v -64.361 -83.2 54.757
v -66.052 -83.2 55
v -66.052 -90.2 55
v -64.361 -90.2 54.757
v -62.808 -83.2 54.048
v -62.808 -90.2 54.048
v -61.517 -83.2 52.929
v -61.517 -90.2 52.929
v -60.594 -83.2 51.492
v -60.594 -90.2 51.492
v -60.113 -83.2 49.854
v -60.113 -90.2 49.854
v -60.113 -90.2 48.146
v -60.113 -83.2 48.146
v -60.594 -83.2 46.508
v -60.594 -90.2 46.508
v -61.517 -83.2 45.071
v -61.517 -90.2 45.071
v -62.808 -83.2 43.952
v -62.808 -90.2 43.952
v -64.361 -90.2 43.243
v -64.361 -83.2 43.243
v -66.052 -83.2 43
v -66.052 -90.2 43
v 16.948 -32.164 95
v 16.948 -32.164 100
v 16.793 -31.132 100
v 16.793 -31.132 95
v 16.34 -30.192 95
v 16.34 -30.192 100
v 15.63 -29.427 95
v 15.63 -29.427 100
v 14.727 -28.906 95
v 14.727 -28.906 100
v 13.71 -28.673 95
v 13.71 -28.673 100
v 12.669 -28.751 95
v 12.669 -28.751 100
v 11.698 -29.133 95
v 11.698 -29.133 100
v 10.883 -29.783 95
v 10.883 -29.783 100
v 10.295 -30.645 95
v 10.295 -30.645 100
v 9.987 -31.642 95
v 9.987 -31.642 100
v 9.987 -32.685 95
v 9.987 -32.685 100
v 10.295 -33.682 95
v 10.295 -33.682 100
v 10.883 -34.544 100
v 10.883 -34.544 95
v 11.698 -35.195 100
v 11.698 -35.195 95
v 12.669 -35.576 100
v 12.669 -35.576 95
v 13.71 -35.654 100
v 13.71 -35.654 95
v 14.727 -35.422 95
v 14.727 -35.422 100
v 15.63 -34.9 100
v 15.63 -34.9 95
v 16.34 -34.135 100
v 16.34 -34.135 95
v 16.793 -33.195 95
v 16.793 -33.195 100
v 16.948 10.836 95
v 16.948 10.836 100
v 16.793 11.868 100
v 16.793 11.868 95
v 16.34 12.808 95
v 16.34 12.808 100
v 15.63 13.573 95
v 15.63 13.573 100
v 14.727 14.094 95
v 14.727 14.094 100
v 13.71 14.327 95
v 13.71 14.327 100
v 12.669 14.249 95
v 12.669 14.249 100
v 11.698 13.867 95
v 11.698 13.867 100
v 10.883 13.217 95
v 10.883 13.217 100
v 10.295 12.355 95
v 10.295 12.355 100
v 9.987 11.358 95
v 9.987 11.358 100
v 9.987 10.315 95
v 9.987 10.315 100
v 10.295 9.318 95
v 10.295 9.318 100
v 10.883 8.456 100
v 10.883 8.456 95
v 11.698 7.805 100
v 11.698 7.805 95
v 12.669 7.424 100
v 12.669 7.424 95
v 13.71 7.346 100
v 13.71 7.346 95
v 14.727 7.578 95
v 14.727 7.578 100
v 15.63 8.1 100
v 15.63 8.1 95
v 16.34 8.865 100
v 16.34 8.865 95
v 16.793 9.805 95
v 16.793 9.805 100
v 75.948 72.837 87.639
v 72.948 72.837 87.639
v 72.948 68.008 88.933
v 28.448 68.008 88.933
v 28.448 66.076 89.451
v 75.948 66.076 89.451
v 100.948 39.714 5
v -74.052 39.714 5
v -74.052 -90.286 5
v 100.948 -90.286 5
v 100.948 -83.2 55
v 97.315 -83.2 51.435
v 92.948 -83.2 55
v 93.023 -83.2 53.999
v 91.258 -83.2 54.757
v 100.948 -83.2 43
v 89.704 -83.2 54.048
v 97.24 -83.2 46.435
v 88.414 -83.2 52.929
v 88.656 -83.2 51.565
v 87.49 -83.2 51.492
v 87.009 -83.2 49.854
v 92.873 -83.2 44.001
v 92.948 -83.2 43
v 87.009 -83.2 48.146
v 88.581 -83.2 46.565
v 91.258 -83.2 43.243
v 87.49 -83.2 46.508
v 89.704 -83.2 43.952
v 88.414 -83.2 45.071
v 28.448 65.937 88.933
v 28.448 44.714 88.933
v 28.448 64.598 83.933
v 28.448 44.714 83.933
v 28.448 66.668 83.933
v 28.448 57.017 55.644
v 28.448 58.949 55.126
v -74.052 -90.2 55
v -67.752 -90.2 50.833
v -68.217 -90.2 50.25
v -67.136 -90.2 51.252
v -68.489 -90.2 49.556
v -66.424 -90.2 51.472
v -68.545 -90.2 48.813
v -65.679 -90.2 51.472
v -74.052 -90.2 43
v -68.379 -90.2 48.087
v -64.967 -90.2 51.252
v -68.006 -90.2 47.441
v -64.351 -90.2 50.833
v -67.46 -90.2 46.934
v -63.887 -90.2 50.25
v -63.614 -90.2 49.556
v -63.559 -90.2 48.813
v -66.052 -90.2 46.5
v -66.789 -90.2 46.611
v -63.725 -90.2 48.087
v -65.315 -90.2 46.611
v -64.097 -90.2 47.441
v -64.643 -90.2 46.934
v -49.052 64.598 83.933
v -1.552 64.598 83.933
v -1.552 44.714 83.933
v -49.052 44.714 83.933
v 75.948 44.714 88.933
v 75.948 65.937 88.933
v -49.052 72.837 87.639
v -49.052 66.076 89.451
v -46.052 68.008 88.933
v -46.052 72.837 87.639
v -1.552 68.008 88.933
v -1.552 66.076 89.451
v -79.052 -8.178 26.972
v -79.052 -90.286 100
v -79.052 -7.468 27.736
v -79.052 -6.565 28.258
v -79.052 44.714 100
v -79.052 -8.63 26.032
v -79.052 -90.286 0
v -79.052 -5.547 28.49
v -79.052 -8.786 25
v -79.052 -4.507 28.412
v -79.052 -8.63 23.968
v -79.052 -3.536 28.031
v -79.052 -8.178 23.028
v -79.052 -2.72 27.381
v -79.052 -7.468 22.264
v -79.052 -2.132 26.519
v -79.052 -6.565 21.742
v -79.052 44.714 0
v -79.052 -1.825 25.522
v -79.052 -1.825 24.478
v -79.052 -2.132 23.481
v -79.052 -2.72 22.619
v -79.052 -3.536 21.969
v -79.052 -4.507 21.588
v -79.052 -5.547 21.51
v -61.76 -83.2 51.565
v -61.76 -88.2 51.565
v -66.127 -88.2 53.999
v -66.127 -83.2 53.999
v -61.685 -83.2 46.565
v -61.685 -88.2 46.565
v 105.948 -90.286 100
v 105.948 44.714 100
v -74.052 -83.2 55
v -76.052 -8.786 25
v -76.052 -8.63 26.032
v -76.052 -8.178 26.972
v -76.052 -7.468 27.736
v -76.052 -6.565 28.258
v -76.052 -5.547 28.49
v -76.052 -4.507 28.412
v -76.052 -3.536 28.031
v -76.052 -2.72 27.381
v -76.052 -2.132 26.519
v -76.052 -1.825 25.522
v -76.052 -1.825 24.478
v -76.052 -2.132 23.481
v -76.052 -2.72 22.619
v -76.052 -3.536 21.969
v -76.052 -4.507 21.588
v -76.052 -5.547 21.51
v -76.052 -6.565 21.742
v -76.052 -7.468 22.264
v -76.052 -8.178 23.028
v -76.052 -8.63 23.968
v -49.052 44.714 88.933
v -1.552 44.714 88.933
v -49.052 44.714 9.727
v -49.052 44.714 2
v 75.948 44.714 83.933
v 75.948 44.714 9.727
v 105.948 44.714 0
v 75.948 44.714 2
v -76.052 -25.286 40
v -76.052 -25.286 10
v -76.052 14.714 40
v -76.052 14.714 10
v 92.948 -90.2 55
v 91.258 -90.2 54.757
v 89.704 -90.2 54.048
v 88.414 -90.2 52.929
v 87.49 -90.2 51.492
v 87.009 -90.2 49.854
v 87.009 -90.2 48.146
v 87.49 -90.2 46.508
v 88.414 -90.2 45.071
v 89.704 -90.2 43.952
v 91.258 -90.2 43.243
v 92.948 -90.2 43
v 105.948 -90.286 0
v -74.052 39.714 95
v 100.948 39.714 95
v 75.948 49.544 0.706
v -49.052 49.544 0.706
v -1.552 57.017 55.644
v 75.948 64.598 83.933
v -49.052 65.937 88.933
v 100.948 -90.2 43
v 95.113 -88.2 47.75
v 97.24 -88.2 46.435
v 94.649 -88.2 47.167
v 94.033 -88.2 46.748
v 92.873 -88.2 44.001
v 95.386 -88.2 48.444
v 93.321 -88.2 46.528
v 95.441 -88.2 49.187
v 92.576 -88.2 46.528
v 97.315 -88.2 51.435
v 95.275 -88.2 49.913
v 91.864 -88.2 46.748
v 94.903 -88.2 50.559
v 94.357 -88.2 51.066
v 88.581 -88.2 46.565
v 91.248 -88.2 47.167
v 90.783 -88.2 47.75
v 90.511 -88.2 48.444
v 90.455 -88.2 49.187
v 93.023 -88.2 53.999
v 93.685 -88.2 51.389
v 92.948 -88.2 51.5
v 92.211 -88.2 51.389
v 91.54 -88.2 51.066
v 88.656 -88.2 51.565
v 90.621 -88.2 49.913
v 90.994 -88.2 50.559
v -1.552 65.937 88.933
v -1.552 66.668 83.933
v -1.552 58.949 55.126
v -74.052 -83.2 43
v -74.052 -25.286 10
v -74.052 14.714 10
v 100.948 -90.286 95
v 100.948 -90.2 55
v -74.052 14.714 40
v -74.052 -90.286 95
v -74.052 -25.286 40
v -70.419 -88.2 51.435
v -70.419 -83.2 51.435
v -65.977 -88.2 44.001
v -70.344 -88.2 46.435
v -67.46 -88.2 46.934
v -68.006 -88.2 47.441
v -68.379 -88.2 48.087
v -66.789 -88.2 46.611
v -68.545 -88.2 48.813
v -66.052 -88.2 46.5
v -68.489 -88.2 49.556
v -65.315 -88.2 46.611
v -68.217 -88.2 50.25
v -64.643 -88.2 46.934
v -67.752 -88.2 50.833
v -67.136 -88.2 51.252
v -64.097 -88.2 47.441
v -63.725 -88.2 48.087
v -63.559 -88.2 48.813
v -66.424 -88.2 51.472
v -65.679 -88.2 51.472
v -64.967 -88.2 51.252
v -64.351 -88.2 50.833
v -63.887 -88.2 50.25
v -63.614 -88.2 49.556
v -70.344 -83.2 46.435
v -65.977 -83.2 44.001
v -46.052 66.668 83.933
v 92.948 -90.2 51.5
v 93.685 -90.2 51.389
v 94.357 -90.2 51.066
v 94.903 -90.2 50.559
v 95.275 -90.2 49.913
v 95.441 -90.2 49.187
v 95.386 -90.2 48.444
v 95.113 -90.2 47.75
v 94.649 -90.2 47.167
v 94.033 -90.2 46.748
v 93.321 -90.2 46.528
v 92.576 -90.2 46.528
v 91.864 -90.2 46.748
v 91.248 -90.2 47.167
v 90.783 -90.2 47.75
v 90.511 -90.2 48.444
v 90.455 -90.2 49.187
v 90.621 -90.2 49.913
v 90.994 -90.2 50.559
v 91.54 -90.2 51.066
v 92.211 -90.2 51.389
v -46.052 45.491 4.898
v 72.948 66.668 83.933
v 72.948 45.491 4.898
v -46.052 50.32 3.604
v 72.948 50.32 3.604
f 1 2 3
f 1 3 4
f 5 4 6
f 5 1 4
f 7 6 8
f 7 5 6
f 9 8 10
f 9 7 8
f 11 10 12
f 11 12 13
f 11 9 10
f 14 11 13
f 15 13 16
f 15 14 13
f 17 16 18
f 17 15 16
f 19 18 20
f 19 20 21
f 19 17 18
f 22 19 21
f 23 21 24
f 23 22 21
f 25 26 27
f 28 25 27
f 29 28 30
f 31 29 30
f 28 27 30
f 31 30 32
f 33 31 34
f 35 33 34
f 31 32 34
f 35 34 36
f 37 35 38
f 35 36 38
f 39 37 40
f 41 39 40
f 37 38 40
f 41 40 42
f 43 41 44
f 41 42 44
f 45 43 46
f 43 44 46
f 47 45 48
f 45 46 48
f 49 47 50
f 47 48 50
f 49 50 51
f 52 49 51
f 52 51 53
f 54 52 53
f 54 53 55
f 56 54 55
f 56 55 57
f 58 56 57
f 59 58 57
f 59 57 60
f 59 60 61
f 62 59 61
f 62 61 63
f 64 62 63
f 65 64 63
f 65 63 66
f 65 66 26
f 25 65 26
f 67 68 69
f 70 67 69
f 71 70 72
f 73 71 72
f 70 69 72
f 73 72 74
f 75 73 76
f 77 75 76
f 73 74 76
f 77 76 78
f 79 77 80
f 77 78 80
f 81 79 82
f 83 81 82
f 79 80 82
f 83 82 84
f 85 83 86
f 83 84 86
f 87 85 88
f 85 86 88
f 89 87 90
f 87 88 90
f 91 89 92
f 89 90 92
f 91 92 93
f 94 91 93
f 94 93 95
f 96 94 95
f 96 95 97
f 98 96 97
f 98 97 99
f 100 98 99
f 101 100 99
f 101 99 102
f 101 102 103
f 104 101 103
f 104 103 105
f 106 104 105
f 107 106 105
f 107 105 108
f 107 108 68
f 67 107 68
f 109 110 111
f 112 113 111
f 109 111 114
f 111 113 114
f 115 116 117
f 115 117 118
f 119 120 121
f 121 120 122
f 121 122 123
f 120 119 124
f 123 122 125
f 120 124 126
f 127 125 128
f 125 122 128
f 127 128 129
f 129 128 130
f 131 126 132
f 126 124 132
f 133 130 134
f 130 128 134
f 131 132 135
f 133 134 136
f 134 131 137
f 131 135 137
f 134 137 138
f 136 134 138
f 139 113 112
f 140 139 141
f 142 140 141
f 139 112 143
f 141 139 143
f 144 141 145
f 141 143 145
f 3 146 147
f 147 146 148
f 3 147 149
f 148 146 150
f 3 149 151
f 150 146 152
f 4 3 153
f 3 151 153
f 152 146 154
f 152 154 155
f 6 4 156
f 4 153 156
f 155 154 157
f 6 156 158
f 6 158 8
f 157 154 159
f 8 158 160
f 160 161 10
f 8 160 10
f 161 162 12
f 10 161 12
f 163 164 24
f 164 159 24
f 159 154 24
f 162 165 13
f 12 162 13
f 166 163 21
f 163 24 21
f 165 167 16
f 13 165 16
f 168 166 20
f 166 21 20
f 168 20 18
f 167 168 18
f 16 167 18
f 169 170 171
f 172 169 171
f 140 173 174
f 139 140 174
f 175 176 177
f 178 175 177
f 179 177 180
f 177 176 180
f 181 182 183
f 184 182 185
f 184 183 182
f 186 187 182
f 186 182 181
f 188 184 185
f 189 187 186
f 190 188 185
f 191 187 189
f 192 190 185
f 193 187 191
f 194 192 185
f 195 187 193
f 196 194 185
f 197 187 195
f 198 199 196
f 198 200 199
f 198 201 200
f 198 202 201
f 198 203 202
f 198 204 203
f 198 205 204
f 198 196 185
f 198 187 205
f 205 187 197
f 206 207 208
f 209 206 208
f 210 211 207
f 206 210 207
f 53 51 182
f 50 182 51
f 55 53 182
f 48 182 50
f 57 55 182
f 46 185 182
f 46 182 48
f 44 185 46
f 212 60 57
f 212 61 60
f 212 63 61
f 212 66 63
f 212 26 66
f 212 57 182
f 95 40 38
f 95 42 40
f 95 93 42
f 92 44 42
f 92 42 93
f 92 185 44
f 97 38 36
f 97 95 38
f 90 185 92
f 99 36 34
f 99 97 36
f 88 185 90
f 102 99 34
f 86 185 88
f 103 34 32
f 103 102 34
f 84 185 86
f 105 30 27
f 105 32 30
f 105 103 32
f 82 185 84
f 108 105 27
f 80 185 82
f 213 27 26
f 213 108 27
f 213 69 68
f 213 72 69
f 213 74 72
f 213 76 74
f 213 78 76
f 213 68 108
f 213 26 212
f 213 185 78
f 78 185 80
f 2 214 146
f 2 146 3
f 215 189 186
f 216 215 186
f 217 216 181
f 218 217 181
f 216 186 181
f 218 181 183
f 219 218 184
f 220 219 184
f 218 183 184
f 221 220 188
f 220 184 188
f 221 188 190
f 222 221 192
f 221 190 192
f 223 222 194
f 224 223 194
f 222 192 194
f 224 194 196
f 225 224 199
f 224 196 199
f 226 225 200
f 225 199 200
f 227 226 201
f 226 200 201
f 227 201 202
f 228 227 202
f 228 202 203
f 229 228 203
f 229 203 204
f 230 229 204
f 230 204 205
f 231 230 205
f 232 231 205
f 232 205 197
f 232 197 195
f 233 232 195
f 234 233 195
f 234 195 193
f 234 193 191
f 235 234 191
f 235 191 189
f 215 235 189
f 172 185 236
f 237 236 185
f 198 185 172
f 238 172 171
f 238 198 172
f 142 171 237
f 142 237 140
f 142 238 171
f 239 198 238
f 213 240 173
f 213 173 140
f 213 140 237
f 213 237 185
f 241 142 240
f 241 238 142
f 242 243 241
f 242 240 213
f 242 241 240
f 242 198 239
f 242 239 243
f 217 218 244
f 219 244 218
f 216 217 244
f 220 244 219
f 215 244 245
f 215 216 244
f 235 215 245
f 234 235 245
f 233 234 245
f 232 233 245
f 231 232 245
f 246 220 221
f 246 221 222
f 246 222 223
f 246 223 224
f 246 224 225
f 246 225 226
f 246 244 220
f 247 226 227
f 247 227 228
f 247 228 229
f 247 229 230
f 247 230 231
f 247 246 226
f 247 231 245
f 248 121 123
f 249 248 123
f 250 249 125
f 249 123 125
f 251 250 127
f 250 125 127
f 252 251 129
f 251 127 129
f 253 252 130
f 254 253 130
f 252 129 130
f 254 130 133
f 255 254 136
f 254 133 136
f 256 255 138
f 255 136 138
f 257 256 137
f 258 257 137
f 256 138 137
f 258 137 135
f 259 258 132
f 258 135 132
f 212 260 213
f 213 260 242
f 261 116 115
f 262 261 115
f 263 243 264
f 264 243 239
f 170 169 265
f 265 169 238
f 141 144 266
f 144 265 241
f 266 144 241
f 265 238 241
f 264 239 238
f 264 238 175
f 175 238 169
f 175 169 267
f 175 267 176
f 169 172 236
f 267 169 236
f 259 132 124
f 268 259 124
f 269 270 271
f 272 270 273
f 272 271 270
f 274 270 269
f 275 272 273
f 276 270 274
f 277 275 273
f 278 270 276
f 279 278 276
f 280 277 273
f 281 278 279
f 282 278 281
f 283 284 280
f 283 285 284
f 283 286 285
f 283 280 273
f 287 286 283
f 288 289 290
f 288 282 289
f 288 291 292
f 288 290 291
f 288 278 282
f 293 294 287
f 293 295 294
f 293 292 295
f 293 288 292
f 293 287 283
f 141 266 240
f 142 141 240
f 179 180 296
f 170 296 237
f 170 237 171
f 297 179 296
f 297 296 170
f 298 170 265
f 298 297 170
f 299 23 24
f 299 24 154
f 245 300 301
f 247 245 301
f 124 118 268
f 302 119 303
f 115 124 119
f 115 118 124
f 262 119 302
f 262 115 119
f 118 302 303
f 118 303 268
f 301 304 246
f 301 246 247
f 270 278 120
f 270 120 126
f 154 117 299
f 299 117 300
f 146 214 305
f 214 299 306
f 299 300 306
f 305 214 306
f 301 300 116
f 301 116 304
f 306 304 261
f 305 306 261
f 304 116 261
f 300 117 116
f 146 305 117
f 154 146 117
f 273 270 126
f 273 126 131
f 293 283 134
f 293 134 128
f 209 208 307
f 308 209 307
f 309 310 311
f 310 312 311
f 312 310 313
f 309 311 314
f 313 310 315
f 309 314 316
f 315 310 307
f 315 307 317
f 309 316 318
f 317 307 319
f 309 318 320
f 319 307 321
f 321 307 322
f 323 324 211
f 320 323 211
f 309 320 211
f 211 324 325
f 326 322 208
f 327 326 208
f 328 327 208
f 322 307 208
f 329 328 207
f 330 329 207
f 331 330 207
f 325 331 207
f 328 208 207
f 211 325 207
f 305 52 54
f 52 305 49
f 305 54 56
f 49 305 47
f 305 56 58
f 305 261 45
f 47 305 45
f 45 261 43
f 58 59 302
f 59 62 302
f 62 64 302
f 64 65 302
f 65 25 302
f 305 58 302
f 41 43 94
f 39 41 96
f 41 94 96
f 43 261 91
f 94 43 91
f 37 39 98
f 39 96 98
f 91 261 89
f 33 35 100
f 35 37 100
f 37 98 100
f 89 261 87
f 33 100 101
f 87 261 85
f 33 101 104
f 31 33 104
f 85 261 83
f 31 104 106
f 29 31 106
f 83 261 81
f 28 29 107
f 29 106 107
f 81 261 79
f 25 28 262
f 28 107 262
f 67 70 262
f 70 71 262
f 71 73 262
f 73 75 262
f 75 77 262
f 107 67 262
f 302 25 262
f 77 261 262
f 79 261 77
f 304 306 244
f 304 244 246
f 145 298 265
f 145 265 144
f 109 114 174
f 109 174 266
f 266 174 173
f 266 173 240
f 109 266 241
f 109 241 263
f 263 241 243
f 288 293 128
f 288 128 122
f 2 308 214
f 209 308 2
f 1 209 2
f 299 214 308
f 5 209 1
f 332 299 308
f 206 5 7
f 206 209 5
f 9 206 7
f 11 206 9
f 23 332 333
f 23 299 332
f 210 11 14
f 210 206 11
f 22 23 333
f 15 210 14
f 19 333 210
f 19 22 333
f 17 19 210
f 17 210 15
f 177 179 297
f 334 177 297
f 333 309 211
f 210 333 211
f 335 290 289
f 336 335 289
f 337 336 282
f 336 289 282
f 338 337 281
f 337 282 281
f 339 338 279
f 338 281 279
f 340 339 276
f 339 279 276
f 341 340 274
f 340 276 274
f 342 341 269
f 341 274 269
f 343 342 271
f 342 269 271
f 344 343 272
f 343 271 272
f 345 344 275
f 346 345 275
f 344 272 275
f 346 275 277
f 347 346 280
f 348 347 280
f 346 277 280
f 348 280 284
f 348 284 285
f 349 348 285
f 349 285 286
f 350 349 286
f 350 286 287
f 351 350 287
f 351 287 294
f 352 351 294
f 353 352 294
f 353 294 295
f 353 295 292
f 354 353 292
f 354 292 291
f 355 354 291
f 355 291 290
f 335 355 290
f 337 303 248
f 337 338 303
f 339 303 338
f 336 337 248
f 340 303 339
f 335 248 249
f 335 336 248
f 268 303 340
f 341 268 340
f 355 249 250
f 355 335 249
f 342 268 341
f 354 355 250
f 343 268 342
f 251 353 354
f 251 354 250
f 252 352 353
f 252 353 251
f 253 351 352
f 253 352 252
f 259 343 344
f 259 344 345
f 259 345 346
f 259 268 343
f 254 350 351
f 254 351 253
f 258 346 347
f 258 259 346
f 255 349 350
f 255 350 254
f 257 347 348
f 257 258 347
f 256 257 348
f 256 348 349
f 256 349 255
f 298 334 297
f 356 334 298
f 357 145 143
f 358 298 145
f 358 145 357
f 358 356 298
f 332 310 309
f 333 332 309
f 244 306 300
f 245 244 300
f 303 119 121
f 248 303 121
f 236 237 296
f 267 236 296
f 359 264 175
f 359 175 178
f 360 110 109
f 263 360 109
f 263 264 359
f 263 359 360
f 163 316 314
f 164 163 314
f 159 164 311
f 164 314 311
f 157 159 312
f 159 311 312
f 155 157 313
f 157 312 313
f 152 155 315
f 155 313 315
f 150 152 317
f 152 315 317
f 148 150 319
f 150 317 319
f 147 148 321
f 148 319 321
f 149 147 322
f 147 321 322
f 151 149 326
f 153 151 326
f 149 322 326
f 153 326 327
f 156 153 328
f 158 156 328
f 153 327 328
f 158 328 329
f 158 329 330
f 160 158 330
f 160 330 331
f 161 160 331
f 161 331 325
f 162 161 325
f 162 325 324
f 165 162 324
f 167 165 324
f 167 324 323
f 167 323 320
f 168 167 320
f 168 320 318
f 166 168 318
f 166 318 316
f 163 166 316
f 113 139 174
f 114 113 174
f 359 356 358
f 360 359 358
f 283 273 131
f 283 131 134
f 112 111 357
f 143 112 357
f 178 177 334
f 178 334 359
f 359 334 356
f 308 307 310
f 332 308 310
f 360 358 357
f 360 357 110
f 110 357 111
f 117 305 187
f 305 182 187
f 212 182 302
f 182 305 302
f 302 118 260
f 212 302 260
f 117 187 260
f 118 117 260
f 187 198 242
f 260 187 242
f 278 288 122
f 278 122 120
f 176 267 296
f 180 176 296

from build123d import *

# Parameters (mm, degrees)
ESBO_O1_W                 = 185
ESBO_O1_H                 = 135
RESSALTO_EXTRUS_O1_DEPTH  = 5
RESSALTO_EXTRUS_O4_START  = 95
ESBO_O1_2_W               = 185
ESBO_O1_2_H               = 135
RESSALTO_EXTRUS_O4_DEPTH  = 5
ESBO_O3_W                 = 185
ESBO_O3_H                 = 100
RESSALTO_EXTRUS_O5_DEPTH  = 5
ESBO_O4_W                 = 100
ESBO_O4_H                 = 135
RESSALTO_EXTRUS_O6_DEPTH  = 5
RESSALTO_EXTRUS_O7_START  = -185
ESBO_O4_3_W               = 100
ESBO_O4_3_H               = 135
RESSALTO_EXTRUS_O7_DEPTH  = 5
ESBO_O8_R                 = 3.5
CORTE_EXTRUS_O1_DEPTH     = 10
RESSALTO_EXTRUS_O10_START = -83.2
ESBO_O10_R                = 2.5
RESSALTO_EXTRUS_O10_DEPTH = 7
CORTE_EXTRUS_O2_START     = -2
CORTE_EXTRUS_O2_DEPTH     = 6
ESBO_O12_R                = 3.5
CORTE_EXTRUS_O4_DEPTH     = 6
ESBO_O13_W                = 30
ESBO_O13_H                = 40
CORTE_EXTRUS_O5_DEPTH     = 2
RESSALTO_EXTRUS_O15_START = -30
RESSALTO_EXTRUS_O15_DEPTH = 125
ESBO_O20_W                = 125
ESBO_O20_H                = 91.931851656
RESSALTO_EXTRUS_O20_DEPTH = 2
RESSALTO_EXTRUS_O21_DEPTH = 5
ESBO_O22_W                = 30
ESBO_O22_H                = 35
CORTE_EXTRUS_O6_DEPTH     = 2
ESBO_O23_W                = 30
ESBO_O23_H                = 21.223161699
CORTE_EXTRUS_O7_DEPTH     = 5


with BuildPart() as part:
    # Esboço1 → Ressalto-extrusão1 (new body)
    with BuildSketch(Plane.XY):
        with Locations((13.448247946, -22.785875217)):
            Rectangle(ESBO_O1_W, ESBO_O1_H)
    extrude(amount=RESSALTO_EXTRUS_O1_DEPTH)



with BuildPart() as body_2:
    # Esboço1<2> → Ressalto-extrusão4 (new body)
    with BuildSketch(Plane.XY.offset(RESSALTO_EXTRUS_O4_START)):
        with Locations((13.448247946, -22.785875217)):
            Rectangle(ESBO_O1_2_W, ESBO_O1_2_H)
    extrude(amount=RESSALTO_EXTRUS_O4_DEPTH)


with BuildPart() as part_1:
    add(part.part)

    add(body_2.part)  # Ressalto-extrusão5 merges body 2
    # Esboço3 → Ressalto-extrusão5 (add)
    with BuildSketch(Plane(origin=(0, 44.714124783, 0), x_dir=(1, 0, 0), z_dir=(0, 1, 0))):
        with Locations((13.448247946, -50)):
            Rectangle(ESBO_O3_W, ESBO_O3_H)
    extrude(amount=-RESSALTO_EXTRUS_O5_DEPTH)

    # Esboço4 → Ressalto-extrusão6 (add)
    with BuildSketch(Plane.ZY.offset(79.051752054)):
        with Locations((50, -22.785875217)):
            Rectangle(ESBO_O4_W, ESBO_O4_H)
    extrude(amount=-RESSALTO_EXTRUS_O6_DEPTH)

    # Esboço4<3> → Ressalto-extrusão7 (add)
    with BuildSketch(Plane.ZY.offset(79.051752054).offset(RESSALTO_EXTRUS_O7_START)):
        with Locations((50, -22.785875217)):
            Rectangle(ESBO_O4_3_W, ESBO_O4_3_H)
    extrude(amount=RESSALTO_EXTRUS_O7_DEPTH)

    # Esboço8 → Corte-extrusão1 (cut)
    with BuildSketch(Plane.XY.offset(100)):
        with Locations((13.448247946, 10.836303666)):
            Circle(ESBO_O8_R)
        with Locations((13.448247946, -32.163696334)):
            Circle(ESBO_O8_R)
    extrude(amount=-CORTE_EXTRUS_O1_DEPTH, mode=Mode.SUBTRACT)

    # Esboço10 → Ressalto-extrusão10 (add)
    # profile 1 of 2: a face of its own
    with BuildSketch(Plane(origin=(0, 0, 0), x_dir=(1, 0, 0), z_dir=(0, 1, 0)).offset(RESSALTO_EXTRUS_O10_START)):
        with BuildLine():
            Line((100.948247946, -55), (92.948247946, -55))
            ThreePointArc((92.948247946, -55), (86.948247946, -49), (92.948247946, -43))
            Line((92.948247946, -43), (100.948247946, -43))
            Line((100.948247946, -43), (100.948247946, -55))
        make_face()
        with Locations((92.948247946, -49)):
            Circle(ESBO_O10_R, mode=Mode.SUBTRACT)
    # profile 2 of 2: a face of its own
    with BuildSketch(Plane(origin=(0, 0, 0), x_dir=(1, 0, 0), z_dir=(0, 1, 0)).offset(RESSALTO_EXTRUS_O10_START)):
        with BuildLine():
            Line((-74.051752054, -43), (-74.051752054, -55))
            Line((-74.051752054, -55), (-66.051752054, -55))
            ThreePointArc((-66.051752054, -55), (-60.051752054, -49), (-66.051752054, -43))
            Line((-66.051752054, -43), (-74.051752054, -43))
        make_face()
        with Locations((-66.051752054, -49)):
            Circle(ESBO_O10_R, mode=Mode.SUBTRACT)
    extrude(amount=-RESSALTO_EXTRUS_O10_DEPTH)

    # Esboço11 → Corte-extrusão2 (cut)
    with BuildSketch(Plane.XZ.offset(90.2).offset(CORTE_EXTRUS_O2_START)):
        Polygon((-61.75961018, 51.564667257), (-66.126748114, 53.999437527), (-70.418889987, 51.43477027), (-70.343893927, 46.435332743), (-65.976755993, 44.000562473), (-61.68461412, 46.56522973), align=None)
        Polygon((88.581110013, 46.56522973), (88.656106073, 51.564667257), (93.023244007, 53.999437527), (97.31538588, 51.43477027), (97.24038982, 46.435332743), (92.873251886, 44.000562473), align=None)
    extrude(amount=-CORTE_EXTRUS_O2_DEPTH, mode=Mode.SUBTRACT)

    # Esboço12 → Corte-extrusão4 (cut)
    with BuildSketch(Plane.ZY.offset(79.051752054)):
        with Locations((25, -5.285875217)):
            Circle(ESBO_O12_R)
    extrude(amount=-CORTE_EXTRUS_O4_DEPTH, mode=Mode.SUBTRACT)

    # Esboço13 → Corte-extrusão5 (cut)
    with BuildSketch(Plane(origin=(-74.051752054, 0, 0), x_dir=(0, 0, -1), z_dir=(1, 0, 0))):
        with Locations((-25, -5.285875217)):
            Rectangle(ESBO_O13_W, ESBO_O13_H)
    extrude(amount=-CORTE_EXTRUS_O5_DEPTH, mode=Mode.SUBTRACT)

    # Esboço15 → Ressalto-extrusão15 (add)
    with BuildSketch(Plane(origin=(105.948247946, 0, 0), x_dir=(0, 0, -1), z_dir=(1, 0, 0)).offset(RESSALTO_EXTRUS_O15_START)):
        Polygon((-83.93332437, 66.66809288), (-83.93332437, 44.714124783), (-88.93332437, 44.714124783), (-88.93332437, 68.007838843), align=None)
    extrude(amount=-RESSALTO_EXTRUS_O15_DEPTH)

    # Esboço20 → Ressalto-extrusão20 (add)
    with BuildSketch(Plane(origin=(0, 41.218846376, -11.044556599), x_dir=(1, 0, 0), z_dir=(0, 0.9659258262890665, -0.25881904510252707))):
        with Locations((13.448247946, -57.538792907)):
            Rectangle(ESBO_O20_W, ESBO_O20_H)
    extrude(amount=-RESSALTO_EXTRUS_O20_DEPTH)

    # Esboço21 → Ressalto-extrusão21 (add)
    with BuildSketch(Plane(origin=(0, 41.218846376, -11.044556599), x_dir=(1, 0, 0), z_dir=(0, 0.9659258262890684, -0.2588190451025204))):
        Polygon((75.948247946, -13.504718735), (-49.051752054, -13.504718735), (-49.051752054, -16.504718735), (-49.051752054, -103.504718735), (-46.051752054, -103.504718735), (-46.051752054, -16.504718735), (72.948247946, -16.504718735), (72.948247946, -103.504718735), (75.948247946, -103.504718735), (75.948247946, -16.504718735), align=None)
    extrude(amount=RESSALTO_EXTRUS_O21_DEPTH)

    # Esboço22 → Corte-extrusão6 (cut)
    with BuildSketch(Plane(origin=(0, 41.218846376, -11.044556599), x_dir=(1, 0, 0), z_dir=(0, 0.9659258262890684, -0.2588190451025204))):
        with Locations((13.448247946, -86.004718735)):
            Rectangle(ESBO_O22_W, ESBO_O22_H)
    extrude(amount=-CORTE_EXTRUS_O6_DEPTH, mode=Mode.SUBTRACT)

    # Esboço23 → Corte-extrusão7 (cut)
    with BuildSketch(Plane.XY.offset(88.93332437)):
        with Locations((13.448247946, 55.325705633)):
            Rectangle(ESBO_O23_W, ESBO_O23_H)
    extrude(amount=-CORTE_EXTRUS_O7_DEPTH, mode=Mode.SUBTRACT)


solid = part_1.part
